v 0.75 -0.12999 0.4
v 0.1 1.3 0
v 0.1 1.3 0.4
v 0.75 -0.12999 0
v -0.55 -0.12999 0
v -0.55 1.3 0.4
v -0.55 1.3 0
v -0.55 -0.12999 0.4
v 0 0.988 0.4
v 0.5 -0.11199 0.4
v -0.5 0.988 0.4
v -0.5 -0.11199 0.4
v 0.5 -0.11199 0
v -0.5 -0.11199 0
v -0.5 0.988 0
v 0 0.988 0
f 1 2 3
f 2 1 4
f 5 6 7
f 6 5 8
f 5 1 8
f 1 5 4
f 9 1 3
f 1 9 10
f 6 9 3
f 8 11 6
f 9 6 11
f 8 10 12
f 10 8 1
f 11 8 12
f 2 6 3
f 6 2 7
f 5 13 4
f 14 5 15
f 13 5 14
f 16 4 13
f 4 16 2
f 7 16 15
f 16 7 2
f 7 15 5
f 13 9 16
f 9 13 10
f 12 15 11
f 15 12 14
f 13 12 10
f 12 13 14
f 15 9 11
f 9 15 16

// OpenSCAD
points = [
	[0, -0.1],
	[0.0, 0.5033072760072159],
	[0.0, 0.5033072760072159],
	[0.0, 1.0],
	[0.5, 1.0],
	[1, -0.1],
	[0, -0.1]
];
difference(){
    
// OUTER COOKIE CUTTER SHAPE
    
    // extrude the outer polygon into a 3D shape
    // this extrusion is thinner than the inner shape to make sure the inner shape "cuts" through it completely
    linear_extrude(0.4)
    
        // x- and y-shift the outer polygon to be roughly centered around the inner shape
        // z-shift the outer polygon so the extruded inner shape cuts all the way through
        translate([-0.55, 0, -0.1])
            
            // scale this polygon up a bit to make an outer ring of a cookie cutter
            scale(1.3, 1.2, 1)
            
                // generate a polygon to become the outer shape
                polygon(points);        
    
// INNER COOKIE CUTTER SHAPE TO BE SUBTRACTED FROM OUTER

    // extrude the inner polygon into a 3D shape
    // this extrusion is thicker than the outer shape to ensure the inner shape "cuts" completey through the outer shape
    // the "scale" parameter grows the shape as it extrudes to give the finished cutter a narrower edge
    linear_extrude(0.6) 
    
        // x-shift the shape to 
        translate([-0.5, -0.012, 0]) //x-center the polygon at origin
            
            // generate a polygon to become the inner shape (this is effectively defining a hole)
            polygon(points);
}
